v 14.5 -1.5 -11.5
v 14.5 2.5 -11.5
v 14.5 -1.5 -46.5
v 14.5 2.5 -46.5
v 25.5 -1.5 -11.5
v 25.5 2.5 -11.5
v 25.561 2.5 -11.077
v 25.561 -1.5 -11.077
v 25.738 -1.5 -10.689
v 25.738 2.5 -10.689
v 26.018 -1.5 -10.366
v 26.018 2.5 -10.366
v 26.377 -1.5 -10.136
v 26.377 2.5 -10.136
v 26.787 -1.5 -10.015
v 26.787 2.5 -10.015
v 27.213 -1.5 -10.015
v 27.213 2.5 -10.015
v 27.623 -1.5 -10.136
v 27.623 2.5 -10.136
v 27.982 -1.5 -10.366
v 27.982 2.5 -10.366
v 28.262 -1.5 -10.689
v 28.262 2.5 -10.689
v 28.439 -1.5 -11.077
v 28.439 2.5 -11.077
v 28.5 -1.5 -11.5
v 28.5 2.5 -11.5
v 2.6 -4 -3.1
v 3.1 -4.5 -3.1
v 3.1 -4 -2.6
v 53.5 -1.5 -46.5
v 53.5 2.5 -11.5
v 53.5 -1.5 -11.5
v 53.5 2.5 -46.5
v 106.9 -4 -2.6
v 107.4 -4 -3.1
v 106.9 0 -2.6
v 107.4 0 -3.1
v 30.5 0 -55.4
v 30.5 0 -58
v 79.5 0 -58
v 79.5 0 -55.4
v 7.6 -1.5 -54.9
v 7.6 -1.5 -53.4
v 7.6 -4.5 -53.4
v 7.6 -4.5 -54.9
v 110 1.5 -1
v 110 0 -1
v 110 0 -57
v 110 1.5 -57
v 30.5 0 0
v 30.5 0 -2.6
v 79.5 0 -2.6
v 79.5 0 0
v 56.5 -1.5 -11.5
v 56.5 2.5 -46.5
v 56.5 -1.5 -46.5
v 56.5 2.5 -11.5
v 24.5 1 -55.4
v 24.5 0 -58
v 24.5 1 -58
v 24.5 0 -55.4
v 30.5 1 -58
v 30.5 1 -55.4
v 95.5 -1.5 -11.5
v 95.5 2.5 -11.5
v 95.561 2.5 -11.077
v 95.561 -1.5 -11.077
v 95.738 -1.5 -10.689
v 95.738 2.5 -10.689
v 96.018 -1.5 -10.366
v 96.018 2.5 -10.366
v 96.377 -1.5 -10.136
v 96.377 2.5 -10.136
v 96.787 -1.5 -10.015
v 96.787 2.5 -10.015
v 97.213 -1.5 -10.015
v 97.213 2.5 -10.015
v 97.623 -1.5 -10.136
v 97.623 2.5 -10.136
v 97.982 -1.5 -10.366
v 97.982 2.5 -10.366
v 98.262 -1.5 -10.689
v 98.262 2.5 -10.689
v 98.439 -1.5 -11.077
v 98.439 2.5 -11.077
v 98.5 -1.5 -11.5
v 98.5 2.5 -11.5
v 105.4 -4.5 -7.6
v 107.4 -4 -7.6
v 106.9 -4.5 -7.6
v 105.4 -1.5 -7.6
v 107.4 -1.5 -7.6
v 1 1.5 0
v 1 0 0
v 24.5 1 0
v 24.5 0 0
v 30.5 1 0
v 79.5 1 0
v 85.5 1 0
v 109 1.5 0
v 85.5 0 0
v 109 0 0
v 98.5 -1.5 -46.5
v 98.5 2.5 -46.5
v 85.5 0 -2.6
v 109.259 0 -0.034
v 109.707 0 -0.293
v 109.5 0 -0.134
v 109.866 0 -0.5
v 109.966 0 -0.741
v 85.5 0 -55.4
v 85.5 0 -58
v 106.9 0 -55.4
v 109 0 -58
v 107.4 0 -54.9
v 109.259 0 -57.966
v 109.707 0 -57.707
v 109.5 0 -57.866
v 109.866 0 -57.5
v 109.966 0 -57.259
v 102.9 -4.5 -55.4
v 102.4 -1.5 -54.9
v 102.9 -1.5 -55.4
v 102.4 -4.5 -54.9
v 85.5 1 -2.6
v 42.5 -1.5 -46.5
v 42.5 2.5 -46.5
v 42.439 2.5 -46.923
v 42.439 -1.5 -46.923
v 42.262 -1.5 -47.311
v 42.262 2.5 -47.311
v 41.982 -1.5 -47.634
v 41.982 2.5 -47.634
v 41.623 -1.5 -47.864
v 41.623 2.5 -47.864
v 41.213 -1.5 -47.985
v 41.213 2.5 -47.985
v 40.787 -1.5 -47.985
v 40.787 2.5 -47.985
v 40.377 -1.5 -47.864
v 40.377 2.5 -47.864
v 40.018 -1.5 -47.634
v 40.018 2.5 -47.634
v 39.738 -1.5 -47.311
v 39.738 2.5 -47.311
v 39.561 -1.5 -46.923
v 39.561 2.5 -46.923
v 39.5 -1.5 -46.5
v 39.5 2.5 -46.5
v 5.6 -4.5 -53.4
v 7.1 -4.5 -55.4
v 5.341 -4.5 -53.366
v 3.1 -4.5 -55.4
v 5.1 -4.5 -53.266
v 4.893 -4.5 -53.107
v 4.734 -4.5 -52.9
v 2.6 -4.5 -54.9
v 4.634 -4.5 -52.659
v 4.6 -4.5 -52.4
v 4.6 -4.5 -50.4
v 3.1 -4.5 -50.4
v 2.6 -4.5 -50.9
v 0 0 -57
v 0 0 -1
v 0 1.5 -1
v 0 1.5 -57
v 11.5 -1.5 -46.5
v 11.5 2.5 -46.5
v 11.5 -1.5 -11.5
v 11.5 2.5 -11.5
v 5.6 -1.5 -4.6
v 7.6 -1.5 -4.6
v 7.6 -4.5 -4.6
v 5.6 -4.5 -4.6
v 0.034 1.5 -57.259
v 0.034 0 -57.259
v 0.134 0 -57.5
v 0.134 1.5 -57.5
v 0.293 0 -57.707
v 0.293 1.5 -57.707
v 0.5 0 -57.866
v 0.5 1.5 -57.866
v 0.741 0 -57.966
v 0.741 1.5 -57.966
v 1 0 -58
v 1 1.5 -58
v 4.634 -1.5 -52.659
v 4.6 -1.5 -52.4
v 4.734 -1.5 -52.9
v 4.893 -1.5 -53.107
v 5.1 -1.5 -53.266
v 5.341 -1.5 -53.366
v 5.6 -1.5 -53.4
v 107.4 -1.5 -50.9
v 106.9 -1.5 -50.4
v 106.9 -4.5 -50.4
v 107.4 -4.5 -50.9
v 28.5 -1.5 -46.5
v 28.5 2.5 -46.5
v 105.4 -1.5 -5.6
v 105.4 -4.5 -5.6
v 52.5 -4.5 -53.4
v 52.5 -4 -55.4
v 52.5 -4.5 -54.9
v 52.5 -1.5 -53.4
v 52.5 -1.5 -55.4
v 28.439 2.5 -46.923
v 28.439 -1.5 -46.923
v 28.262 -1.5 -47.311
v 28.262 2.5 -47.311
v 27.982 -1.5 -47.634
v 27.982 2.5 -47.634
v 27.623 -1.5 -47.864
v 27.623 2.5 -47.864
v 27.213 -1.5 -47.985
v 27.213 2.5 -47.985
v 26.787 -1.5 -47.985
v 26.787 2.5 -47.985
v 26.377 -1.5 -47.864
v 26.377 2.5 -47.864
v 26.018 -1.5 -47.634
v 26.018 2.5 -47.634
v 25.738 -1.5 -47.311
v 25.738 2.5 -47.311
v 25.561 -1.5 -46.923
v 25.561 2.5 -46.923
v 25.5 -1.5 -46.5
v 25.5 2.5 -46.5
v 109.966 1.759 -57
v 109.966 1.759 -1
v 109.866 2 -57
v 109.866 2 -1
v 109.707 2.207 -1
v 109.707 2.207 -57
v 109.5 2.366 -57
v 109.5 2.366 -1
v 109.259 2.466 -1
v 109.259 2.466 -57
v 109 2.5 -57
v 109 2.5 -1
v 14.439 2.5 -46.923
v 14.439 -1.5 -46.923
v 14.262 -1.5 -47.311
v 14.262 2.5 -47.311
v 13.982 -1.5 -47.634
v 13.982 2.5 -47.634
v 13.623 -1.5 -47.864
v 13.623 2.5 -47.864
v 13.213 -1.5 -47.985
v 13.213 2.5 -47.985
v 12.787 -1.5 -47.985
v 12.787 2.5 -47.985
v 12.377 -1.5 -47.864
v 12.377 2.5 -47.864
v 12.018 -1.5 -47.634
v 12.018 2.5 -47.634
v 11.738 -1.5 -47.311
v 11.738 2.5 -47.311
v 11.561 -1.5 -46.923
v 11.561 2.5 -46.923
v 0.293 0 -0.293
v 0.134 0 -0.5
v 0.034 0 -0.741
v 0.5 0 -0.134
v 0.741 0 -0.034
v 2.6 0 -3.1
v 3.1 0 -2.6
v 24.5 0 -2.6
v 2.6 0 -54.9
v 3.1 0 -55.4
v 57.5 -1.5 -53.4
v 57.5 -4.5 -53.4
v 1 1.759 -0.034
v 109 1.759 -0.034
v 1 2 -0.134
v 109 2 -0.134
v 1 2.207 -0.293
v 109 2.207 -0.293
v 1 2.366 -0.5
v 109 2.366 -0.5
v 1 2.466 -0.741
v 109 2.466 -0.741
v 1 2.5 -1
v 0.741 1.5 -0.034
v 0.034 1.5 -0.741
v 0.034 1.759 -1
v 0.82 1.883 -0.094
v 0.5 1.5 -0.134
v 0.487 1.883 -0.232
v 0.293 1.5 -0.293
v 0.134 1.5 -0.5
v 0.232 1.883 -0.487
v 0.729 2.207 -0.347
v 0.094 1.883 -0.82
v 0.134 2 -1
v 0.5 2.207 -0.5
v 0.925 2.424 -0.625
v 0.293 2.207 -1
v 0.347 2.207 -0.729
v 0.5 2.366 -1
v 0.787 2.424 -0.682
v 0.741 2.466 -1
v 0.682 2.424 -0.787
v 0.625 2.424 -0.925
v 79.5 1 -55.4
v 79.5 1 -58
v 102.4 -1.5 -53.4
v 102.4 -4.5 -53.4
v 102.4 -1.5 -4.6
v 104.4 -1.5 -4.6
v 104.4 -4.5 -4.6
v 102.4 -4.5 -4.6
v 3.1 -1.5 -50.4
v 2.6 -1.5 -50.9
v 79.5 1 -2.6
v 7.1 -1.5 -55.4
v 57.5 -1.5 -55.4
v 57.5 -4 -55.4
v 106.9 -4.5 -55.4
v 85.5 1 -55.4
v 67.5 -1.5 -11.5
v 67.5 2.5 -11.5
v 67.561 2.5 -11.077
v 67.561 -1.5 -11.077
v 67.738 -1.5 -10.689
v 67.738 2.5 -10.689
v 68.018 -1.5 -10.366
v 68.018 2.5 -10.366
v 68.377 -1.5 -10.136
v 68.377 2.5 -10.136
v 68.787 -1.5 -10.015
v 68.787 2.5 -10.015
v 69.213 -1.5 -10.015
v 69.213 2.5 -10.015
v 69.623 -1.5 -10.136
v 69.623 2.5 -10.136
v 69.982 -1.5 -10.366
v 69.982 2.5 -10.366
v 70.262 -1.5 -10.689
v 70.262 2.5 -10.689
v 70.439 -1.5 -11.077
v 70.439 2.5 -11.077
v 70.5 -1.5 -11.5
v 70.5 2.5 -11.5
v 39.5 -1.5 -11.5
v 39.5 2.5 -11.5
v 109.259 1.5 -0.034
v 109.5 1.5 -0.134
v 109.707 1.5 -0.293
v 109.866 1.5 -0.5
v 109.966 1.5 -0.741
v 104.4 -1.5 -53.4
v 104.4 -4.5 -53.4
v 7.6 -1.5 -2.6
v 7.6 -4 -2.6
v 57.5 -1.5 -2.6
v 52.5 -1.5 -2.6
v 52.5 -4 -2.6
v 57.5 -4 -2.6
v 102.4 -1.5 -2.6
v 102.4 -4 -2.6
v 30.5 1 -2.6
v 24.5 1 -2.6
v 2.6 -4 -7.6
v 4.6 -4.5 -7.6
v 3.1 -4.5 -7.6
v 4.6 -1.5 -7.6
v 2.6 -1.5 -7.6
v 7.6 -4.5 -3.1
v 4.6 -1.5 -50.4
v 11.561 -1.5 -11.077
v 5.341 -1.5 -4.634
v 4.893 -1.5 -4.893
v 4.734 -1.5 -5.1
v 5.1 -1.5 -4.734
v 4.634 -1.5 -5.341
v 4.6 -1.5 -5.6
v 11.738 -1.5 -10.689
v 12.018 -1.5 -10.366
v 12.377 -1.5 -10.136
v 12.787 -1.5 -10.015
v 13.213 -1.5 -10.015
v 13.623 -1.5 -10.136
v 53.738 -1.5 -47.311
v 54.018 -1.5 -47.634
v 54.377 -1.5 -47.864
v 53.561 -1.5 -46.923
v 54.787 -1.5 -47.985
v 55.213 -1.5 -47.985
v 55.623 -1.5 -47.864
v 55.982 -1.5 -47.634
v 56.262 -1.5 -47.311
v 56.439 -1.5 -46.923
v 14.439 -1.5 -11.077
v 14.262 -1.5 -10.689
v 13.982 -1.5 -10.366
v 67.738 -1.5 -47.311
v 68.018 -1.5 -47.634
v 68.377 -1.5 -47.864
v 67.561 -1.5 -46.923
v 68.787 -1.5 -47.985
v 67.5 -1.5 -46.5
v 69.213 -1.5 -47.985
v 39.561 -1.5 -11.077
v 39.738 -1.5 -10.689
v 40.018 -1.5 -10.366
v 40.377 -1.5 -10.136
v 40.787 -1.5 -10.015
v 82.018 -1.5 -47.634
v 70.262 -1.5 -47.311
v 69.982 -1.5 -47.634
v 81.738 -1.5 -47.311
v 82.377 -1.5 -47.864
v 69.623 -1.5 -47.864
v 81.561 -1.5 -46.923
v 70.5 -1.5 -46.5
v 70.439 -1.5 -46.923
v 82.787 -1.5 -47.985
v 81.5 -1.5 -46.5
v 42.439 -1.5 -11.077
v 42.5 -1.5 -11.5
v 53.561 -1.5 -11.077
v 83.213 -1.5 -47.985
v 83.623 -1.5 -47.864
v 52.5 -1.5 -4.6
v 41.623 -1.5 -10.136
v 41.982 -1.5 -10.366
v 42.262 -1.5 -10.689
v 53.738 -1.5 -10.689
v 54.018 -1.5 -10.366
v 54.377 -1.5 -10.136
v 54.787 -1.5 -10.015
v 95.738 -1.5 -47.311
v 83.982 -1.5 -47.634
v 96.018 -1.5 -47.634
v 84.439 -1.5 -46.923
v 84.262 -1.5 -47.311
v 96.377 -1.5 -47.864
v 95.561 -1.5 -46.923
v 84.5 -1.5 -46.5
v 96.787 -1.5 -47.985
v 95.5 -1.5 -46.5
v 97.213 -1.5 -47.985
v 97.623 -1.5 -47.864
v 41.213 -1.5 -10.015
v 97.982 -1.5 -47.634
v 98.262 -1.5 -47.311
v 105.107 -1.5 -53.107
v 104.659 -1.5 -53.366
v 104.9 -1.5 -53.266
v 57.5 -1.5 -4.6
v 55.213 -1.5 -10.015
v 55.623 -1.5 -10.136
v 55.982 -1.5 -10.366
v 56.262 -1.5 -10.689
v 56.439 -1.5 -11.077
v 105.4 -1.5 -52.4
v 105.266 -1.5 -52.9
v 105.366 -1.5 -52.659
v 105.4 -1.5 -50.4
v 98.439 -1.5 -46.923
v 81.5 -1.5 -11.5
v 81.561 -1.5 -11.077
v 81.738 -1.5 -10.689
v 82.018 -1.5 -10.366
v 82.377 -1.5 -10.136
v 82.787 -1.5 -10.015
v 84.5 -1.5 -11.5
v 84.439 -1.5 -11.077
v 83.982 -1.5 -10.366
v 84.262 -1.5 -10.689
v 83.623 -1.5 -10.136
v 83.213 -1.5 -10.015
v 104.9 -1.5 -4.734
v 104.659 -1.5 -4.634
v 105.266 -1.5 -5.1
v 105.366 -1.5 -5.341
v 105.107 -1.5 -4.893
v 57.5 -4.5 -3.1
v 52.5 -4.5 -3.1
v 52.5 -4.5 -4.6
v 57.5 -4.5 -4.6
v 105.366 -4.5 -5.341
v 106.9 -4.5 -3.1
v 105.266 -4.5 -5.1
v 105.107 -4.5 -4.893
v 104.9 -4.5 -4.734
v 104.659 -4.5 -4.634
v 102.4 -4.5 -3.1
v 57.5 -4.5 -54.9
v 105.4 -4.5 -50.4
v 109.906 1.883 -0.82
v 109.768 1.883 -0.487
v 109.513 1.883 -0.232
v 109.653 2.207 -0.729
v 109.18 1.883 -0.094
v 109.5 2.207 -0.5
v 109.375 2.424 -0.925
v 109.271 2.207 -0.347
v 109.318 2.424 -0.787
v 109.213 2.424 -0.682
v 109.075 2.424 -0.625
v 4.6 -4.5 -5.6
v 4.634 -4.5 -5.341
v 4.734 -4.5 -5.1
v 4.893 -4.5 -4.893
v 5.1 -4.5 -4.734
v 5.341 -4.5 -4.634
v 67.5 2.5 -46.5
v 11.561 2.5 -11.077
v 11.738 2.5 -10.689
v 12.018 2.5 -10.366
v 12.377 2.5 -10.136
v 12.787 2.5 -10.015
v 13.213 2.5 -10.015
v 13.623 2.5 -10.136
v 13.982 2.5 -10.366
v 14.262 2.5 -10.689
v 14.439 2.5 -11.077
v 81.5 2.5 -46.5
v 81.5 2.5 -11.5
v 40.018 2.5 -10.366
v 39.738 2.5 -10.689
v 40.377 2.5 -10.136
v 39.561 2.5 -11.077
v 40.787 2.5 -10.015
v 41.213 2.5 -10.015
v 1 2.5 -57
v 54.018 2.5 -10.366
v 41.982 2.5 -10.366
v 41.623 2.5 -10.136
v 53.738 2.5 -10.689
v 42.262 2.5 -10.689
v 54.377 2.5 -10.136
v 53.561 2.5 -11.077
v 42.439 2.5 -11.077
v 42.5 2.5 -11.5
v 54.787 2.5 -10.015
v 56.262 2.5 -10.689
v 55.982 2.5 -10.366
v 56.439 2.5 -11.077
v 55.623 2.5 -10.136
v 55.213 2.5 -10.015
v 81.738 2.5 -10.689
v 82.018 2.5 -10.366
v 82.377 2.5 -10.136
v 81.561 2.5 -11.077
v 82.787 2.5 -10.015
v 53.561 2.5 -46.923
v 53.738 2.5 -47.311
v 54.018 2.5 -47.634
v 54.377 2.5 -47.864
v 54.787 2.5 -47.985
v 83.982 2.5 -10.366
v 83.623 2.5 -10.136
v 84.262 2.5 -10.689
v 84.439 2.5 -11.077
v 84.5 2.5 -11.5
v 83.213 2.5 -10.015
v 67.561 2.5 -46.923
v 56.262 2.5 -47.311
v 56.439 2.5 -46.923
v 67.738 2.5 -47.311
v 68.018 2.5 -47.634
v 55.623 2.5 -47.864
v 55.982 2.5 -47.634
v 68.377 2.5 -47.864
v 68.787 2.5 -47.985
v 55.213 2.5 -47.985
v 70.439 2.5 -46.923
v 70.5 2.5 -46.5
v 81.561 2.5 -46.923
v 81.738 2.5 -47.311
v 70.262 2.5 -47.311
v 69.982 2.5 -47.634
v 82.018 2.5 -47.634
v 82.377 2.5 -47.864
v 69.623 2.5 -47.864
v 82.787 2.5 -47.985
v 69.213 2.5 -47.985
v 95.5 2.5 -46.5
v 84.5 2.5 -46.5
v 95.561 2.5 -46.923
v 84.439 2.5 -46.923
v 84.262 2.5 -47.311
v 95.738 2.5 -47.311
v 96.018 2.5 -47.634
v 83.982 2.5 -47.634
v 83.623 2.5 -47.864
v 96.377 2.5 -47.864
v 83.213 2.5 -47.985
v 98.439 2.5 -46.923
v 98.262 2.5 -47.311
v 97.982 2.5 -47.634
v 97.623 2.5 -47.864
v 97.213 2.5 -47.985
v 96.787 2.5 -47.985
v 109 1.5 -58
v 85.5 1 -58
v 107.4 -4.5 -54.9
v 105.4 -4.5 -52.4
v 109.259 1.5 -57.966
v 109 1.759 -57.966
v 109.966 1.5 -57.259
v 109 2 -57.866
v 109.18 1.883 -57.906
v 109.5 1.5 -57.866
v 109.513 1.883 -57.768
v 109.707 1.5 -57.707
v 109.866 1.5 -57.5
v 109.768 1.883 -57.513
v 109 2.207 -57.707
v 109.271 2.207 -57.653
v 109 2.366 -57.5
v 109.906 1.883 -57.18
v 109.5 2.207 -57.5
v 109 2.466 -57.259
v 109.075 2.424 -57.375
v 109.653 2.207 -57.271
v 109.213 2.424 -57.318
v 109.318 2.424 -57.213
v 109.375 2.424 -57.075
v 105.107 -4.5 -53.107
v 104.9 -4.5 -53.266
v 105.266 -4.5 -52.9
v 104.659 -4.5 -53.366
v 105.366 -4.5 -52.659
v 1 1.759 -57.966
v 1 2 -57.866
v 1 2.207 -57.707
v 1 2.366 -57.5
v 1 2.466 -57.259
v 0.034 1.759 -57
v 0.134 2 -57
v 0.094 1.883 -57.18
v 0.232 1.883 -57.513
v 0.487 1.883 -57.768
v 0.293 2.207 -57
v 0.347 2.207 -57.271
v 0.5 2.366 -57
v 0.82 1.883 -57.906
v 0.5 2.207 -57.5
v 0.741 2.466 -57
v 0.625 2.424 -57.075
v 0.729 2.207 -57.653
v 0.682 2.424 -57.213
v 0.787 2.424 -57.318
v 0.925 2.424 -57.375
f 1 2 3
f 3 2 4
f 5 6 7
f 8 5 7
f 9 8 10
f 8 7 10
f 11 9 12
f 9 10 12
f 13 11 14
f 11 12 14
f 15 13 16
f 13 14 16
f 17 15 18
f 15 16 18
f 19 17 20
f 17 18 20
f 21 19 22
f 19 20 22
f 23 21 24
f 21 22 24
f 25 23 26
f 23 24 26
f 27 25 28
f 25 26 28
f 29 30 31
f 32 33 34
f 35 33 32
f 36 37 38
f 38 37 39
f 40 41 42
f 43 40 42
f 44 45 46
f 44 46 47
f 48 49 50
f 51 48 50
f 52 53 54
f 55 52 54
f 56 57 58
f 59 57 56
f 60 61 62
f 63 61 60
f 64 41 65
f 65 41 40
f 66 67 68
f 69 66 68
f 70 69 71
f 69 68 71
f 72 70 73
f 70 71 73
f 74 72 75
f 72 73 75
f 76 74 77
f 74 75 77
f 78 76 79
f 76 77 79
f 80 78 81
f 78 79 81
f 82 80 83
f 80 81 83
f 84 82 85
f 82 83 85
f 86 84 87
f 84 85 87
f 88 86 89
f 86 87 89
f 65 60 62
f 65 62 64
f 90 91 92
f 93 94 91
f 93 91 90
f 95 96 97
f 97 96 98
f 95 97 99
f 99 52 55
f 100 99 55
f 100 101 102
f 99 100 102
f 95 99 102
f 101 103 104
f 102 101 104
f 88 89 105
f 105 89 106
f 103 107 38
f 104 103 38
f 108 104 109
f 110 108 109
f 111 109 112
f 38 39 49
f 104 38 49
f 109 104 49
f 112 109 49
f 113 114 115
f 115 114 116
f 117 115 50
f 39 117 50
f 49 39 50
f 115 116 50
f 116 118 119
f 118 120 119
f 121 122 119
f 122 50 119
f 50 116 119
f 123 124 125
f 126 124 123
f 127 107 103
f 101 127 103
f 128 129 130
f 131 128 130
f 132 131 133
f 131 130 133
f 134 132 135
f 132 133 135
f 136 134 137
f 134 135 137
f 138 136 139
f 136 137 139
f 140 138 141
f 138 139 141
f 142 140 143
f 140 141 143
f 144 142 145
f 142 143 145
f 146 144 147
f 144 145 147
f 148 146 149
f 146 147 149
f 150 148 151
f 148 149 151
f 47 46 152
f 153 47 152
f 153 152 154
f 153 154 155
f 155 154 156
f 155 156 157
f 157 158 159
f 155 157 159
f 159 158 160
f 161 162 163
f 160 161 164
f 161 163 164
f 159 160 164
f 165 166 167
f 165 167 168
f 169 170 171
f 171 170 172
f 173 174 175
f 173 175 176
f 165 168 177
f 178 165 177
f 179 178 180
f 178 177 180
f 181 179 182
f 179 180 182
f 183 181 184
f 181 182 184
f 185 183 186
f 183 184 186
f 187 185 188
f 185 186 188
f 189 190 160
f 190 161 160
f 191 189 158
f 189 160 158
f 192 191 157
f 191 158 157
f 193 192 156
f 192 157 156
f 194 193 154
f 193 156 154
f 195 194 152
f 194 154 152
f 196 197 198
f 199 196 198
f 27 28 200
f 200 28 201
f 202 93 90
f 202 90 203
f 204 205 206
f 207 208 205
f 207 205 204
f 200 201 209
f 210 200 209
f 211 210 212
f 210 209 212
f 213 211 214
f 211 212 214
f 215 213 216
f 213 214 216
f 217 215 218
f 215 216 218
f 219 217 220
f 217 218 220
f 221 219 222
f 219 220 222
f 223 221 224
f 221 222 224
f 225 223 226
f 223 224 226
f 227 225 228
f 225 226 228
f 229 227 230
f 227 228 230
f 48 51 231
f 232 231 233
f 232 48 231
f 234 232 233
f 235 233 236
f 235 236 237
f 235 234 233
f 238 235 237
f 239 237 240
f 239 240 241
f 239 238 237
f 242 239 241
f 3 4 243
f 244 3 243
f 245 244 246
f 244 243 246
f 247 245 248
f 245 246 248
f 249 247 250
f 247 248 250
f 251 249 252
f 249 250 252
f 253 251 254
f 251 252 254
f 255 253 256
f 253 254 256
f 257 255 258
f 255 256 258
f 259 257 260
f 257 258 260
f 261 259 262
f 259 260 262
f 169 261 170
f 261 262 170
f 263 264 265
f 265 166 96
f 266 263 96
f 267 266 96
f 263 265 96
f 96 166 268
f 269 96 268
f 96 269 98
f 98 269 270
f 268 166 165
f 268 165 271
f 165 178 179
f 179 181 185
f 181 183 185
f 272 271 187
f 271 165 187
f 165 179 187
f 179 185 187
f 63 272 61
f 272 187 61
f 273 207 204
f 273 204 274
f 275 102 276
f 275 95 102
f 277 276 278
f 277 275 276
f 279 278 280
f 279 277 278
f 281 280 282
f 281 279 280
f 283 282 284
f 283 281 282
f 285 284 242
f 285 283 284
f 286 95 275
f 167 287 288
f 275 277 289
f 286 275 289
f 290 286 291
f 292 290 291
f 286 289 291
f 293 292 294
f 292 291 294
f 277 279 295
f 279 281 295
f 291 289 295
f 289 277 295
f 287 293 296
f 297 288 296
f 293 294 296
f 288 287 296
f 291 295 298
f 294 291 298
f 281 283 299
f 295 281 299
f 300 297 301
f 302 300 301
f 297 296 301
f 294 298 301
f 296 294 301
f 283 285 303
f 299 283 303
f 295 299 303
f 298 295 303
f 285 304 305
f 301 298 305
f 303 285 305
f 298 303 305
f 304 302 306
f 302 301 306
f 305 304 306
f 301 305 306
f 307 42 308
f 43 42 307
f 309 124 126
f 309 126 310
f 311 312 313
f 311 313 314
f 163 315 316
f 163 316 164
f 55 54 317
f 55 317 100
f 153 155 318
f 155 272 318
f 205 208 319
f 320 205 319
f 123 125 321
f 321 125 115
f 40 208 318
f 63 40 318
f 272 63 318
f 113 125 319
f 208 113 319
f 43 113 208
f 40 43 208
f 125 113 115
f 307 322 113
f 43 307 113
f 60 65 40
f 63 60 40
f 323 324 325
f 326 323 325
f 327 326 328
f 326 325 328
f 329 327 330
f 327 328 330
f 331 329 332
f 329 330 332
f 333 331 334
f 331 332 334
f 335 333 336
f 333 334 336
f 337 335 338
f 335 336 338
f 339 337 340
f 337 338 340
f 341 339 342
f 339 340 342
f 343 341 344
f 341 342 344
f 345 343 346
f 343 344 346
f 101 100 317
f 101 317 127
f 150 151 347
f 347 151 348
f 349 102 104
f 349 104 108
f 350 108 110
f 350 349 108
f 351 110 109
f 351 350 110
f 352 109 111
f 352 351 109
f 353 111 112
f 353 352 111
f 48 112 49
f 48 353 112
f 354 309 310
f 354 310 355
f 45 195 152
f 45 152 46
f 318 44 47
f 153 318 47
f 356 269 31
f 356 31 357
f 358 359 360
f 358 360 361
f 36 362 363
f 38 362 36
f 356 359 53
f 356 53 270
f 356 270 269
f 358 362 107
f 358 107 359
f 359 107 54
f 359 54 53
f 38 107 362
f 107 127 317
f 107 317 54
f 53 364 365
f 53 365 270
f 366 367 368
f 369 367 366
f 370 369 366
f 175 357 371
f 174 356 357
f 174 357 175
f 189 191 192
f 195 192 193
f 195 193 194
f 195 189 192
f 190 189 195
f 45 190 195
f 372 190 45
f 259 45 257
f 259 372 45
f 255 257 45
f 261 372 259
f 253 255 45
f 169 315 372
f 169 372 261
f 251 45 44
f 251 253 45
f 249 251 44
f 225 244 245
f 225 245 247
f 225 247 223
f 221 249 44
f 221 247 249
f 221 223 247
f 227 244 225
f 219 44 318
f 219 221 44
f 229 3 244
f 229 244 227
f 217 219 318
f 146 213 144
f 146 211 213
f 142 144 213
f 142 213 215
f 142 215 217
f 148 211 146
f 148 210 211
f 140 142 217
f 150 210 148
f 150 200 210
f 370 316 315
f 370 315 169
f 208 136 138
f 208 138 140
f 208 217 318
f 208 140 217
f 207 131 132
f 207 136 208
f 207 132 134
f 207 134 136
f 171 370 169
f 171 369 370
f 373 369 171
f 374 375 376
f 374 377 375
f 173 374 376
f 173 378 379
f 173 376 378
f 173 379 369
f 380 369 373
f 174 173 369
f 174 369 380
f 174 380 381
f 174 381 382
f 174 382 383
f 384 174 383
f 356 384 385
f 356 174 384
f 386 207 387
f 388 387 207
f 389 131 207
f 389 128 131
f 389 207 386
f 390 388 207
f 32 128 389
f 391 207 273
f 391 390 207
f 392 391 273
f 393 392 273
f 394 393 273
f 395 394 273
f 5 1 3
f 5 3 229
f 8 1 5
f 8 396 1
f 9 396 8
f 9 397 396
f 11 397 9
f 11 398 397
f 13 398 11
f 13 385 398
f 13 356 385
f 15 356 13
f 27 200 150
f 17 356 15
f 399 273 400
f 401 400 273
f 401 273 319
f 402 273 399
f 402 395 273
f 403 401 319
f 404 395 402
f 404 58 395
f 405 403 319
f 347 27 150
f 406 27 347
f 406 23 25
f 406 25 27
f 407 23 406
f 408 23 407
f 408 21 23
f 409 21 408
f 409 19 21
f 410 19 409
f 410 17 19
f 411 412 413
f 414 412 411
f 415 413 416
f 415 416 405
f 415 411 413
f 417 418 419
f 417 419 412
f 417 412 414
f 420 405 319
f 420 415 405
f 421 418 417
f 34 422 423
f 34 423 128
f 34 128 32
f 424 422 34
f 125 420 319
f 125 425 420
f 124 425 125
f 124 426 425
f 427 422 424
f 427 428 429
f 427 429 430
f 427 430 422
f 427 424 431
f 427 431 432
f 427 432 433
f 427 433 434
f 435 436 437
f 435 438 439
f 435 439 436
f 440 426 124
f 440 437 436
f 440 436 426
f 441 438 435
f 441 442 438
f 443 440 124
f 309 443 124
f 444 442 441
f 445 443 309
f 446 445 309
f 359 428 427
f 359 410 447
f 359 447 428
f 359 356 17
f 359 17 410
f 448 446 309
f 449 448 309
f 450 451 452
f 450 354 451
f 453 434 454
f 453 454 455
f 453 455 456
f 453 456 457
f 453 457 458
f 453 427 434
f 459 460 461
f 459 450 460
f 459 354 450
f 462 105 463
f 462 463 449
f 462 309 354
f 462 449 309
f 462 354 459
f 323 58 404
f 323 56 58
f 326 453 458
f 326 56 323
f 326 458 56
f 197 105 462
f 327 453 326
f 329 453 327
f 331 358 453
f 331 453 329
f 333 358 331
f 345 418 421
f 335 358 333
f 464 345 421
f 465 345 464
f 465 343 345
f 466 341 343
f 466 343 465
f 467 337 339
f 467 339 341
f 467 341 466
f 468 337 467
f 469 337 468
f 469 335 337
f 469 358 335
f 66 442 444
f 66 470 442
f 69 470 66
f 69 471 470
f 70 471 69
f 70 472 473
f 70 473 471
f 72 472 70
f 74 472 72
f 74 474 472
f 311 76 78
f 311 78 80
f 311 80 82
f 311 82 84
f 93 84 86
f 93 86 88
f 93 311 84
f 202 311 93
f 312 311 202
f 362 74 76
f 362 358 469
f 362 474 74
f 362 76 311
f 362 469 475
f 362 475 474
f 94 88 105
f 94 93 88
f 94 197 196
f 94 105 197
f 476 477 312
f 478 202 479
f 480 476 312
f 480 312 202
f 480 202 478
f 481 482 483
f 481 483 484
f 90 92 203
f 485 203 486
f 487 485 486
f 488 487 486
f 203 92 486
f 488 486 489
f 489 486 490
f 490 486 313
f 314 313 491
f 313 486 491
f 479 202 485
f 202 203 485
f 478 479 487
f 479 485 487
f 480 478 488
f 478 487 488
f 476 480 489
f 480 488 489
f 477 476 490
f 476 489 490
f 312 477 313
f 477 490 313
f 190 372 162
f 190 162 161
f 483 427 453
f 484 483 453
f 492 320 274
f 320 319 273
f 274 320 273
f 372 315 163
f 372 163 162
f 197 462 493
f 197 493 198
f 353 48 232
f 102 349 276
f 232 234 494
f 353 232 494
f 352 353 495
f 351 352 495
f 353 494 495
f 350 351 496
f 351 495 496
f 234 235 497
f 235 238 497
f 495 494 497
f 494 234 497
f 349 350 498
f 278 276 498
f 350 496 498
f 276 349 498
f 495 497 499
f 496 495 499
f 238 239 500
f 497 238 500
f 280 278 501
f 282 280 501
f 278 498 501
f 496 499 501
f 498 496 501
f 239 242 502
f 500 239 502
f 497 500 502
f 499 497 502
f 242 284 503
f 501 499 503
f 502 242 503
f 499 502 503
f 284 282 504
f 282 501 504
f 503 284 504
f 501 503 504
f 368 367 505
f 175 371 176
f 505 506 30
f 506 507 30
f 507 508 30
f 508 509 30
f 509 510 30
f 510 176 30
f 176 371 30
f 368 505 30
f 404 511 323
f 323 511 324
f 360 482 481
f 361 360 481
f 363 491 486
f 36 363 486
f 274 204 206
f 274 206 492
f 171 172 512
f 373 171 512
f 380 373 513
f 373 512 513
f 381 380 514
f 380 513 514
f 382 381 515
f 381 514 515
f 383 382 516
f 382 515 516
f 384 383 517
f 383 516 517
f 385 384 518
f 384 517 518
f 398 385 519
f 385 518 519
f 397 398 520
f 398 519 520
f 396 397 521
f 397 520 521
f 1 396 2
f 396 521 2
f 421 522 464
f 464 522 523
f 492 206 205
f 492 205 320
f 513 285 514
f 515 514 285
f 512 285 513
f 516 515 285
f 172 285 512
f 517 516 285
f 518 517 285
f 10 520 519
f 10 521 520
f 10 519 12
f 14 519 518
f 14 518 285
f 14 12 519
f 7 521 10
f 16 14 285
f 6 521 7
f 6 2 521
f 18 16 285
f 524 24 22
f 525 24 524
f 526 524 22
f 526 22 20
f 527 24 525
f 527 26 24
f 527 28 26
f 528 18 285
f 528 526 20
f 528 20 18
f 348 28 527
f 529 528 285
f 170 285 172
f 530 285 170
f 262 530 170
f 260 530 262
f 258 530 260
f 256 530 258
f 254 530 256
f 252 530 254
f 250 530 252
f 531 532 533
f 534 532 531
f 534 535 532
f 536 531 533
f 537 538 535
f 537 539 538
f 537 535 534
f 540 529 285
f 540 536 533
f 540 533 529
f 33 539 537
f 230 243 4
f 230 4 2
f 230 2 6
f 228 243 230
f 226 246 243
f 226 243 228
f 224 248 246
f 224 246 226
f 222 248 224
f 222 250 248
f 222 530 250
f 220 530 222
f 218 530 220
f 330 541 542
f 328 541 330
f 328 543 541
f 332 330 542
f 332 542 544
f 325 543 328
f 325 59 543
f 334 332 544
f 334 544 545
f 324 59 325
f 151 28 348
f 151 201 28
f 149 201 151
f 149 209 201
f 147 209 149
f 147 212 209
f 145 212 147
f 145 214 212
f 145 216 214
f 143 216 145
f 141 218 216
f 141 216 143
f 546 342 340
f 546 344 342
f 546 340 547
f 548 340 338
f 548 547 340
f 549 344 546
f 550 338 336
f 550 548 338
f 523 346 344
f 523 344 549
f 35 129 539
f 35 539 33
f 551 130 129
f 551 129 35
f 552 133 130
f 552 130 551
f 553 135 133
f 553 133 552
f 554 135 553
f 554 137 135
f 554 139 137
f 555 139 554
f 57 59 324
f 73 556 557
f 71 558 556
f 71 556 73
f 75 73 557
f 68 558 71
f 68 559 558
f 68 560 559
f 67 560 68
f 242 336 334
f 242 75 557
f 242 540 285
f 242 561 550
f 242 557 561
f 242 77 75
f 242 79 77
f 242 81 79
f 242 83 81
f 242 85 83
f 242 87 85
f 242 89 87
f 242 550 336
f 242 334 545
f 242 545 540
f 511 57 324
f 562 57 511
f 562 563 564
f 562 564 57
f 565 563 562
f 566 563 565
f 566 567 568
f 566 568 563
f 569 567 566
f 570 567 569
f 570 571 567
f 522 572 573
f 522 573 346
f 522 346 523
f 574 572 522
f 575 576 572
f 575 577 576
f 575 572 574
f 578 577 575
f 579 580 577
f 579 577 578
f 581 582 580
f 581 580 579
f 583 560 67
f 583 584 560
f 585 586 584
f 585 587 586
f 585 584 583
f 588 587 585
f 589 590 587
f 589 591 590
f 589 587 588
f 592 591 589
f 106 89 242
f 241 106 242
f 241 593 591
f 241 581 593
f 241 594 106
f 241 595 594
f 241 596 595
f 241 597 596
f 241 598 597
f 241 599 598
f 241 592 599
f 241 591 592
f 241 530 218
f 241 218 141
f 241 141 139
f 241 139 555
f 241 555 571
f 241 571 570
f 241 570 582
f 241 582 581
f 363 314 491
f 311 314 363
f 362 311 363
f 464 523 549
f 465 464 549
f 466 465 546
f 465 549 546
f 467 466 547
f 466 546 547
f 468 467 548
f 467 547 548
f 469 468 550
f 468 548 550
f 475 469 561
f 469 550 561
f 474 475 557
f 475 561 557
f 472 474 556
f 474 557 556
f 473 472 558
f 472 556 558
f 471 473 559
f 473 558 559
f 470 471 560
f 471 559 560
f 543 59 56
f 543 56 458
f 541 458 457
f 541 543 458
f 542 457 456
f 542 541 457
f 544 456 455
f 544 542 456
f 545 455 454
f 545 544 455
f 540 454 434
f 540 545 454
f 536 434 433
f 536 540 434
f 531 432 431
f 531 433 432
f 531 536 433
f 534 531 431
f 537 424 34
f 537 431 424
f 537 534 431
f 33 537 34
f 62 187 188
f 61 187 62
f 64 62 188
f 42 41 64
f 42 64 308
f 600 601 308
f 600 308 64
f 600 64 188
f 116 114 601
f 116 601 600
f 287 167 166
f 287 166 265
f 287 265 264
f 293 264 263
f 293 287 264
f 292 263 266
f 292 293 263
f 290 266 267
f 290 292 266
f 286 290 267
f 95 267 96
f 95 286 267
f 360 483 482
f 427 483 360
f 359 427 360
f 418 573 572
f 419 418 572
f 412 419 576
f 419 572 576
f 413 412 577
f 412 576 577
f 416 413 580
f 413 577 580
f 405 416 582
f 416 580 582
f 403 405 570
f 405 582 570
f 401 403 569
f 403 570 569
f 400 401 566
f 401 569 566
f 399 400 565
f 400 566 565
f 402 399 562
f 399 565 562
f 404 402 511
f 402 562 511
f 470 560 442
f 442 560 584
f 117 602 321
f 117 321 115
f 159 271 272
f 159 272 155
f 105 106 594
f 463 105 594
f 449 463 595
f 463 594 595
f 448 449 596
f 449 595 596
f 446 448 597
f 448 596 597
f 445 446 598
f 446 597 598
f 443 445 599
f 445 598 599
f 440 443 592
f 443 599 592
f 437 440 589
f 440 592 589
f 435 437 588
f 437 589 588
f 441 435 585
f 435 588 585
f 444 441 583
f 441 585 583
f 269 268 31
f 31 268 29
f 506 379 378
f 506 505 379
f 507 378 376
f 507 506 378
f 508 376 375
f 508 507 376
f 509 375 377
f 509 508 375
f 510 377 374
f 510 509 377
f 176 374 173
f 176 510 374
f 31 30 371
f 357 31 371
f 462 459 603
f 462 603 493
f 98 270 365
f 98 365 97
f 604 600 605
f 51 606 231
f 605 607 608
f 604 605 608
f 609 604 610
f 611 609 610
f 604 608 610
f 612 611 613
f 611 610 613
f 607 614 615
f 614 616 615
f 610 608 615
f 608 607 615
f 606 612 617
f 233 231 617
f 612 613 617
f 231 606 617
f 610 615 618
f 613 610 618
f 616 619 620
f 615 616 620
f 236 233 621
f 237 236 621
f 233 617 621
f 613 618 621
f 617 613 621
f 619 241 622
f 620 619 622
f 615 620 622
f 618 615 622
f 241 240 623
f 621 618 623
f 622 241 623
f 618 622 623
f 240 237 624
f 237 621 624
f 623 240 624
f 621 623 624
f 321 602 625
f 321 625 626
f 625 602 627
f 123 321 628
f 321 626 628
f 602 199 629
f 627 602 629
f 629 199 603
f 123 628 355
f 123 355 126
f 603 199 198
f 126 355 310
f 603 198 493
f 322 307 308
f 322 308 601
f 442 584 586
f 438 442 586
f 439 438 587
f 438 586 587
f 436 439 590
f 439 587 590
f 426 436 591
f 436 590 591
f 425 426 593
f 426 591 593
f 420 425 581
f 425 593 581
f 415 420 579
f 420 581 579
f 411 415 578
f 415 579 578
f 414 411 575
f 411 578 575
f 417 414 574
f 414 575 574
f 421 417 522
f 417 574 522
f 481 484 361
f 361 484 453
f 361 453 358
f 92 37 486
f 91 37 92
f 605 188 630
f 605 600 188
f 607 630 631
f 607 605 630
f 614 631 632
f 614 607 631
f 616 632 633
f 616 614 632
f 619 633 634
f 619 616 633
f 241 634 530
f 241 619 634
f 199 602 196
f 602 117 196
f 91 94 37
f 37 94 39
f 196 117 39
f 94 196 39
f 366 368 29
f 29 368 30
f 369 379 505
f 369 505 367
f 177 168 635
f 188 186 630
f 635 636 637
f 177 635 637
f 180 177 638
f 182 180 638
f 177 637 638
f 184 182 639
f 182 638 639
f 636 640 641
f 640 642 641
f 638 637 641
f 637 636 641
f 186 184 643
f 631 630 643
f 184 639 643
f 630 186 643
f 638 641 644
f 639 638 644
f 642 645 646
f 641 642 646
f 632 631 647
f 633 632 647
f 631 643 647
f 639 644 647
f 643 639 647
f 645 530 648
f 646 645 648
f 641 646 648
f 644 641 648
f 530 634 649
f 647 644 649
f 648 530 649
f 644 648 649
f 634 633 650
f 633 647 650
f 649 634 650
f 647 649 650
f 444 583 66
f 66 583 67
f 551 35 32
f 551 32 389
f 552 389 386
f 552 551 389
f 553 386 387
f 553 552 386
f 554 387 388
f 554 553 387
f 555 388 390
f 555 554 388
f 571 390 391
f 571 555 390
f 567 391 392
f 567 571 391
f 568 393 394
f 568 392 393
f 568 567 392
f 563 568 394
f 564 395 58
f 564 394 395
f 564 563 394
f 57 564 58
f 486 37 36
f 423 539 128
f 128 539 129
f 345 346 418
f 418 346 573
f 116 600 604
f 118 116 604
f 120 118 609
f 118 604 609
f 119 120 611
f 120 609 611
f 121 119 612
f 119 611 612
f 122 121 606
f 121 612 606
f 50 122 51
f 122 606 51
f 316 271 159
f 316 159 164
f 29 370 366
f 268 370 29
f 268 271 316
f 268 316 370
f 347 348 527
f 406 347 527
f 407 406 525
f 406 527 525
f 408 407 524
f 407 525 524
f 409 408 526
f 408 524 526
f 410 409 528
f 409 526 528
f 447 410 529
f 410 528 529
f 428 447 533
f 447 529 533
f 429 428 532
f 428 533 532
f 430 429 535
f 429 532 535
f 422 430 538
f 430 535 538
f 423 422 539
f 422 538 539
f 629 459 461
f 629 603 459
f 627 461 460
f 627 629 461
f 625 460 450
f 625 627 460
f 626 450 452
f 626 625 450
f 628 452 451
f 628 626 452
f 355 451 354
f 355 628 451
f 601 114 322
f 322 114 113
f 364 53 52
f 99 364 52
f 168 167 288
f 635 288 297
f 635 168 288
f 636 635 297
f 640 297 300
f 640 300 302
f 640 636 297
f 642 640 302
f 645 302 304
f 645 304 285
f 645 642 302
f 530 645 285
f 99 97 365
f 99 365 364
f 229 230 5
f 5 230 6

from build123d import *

# Parameters (mm, degrees)
SKETCH1_W           = 110
SKETCH1_H           = 58
BOSS_EXTRUDE1_DEPTH = 2.5
SKETCH2_W           = 104.8
SKETCH2_H           = 52.8
BOSS_EXTRUDE2_DEPTH = 1.5
SKETCH3_W           = 5
SKETCH3_H           = 2
BOSS_EXTRUDE3_DEPTH = 3
FILLET1_R           = 1
SKETCH4_W           = 6
SKETCH4_H           = 2.6
CUT_EXTRUDE1_DEPTH  = 1
FILLET2_R           = 1
CHAMFER1_SIZE       = 0.5
CUT_EXTRUDE2_DEPTH  = 125.551194294
FILLET3_R           = 1


with BuildPart() as part:
    # Sketch1 → Boss-Extrude1 (new body)
    with BuildSketch(Plane(origin=(0, 0, 0), x_dir=(1, 0, 0), z_dir=(0, 1, 0))):
        with Locations((55, 29)):
            Rectangle(SKETCH1_W, SKETCH1_H)
    extrude(amount=BOSS_EXTRUDE1_DEPTH)

    # Sketch2 → Boss-Extrude2 (add)
    with BuildSketch(Plane.XZ):
        with Locations((55, -29)):
            Rectangle(SKETCH2_W, SKETCH2_H)
    extrude(amount=BOSS_EXTRUDE2_DEPTH)

    # Sketch3 → Boss-Extrude3 (add)
    with BuildSketch(Plane.XZ.offset(1.5)):
        with Locations((55, -3.6)):
            Rectangle(SKETCH3_W, SKETCH3_H)
        Polygon((2.6, -2.6), (7.6, -2.6), (7.6, -4.6), (4.6, -4.6), (4.6, -7.6), (2.6, -7.6), align=None)
        Polygon((107.4, -2.6), (107.4, -7.6), (105.4, -7.6), (105.4, -4.6), (102.4, -4.6), (102.4, -2.6), align=None)
        Polygon((107.4, -55.4), (102.4, -55.4), (102.4, -53.4), (105.4, -53.4), (105.4, -50.4), (107.4, -50.4), align=None)
        with Locations((55, -54.4)):
            Rectangle(SKETCH3_W, SKETCH3_H)
        Polygon((2.6, -55.4), (2.6, -50.4), (4.6, -50.4), (4.6, -53.4), (7.6, -53.4), (7.6, -55.4), align=None)
    extrude(amount=BOSS_EXTRUDE3_DEPTH)

    # Fillet1
    fillet1_edges = [part.edges().sort_by_distance(p)[0] for p in [
        (105.4, -3, -53.4),
        (4.6, -3, -4.6),
        (105.4, -3, -4.6),
        (4.6, -3, -53.4),
    ]]
    fillet(fillet1_edges, radius=FILLET1_R)

    # Sketch4 → Cut-Extrude1 (cut)
    with BuildSketch(Plane.XZ):
        with Locations((27.5, -1.3)):
            Rectangle(SKETCH4_W, SKETCH4_H)
        with Locations((82.5, -1.3)):
            Rectangle(SKETCH4_W, SKETCH4_H)
        with Locations((82.5, -56.7)):
            Rectangle(SKETCH4_W, SKETCH4_H)
        with Locations((27.5, -56.7)):
            Rectangle(SKETCH4_W, SKETCH4_H)
    extrude(amount=-CUT_EXTRUDE1_DEPTH, mode=Mode.SUBTRACT)

    # Fillet2
    fillet2_edges = [part.edges().sort_by_distance(p)[0] for p in [
        (0, 1.25, -58),
        (110, 1.25, -58),
        (110, 1.25, 0),
        (0, 1.25, 0),
    ]]
    fillet(fillet2_edges, radius=FILLET2_R)

    # Chamfer1
    chamfer1_edges = [part.edges().sort_by_distance(p)[0] for p in [
        (55, -4.5, -55.4),
        (2.6, -3, -50.4),
        (2.6, -2.25, -55.4),
        (7.6, -3, -55.4),
        (107.4, -3, -50.4),
        (102.4, -3, -55.4),
        (107.4, -2.25, -55.4),
        (107.4, -2.25, -2.6),
        (107.4, -4.5, -5.1),
        (104.9, -4.5, -2.6),
        (55, -4.5, -2.6),
        (2.6, -4.5, -5.1),
        (5.1, -4.5, -2.6),
        (2.6, -2.25, -2.6),
    ]]
    chamfer(chamfer1_edges, length=CHAMFER1_SIZE)

    # Sketch5 → Cut-Extrude2 (cut, through all)
    with BuildSketch(Plane(origin=(0, 2.5, 0), x_dir=(1, 0, 0), z_dir=(0, 1, 0))):
        with BuildLine():
            Line((56.5, 46.5), (56.5, 11.5))
            ThreePointArc((56.5, 11.5), (55, 10), (53.5, 11.5))
            Line((53.5, 11.5), (53.5, 46.5))
            ThreePointArc((53.5, 46.5), (55, 48), (56.5, 46.5))
        make_face()
        with BuildLine():
            Line((67.5, 46.5), (67.5, 11.5))
            ThreePointArc((67.5, 11.5), (69, 10), (70.5, 11.5))
            Line((70.5, 11.5), (70.5, 46.5))
            ThreePointArc((70.5, 46.5), (69, 48), (67.5, 46.5))
        make_face()
        with BuildLine():
            Line((81.5, 46.5), (81.5, 11.5))
            ThreePointArc((81.5, 11.5), (83, 10), (84.5, 11.5))
            Line((84.5, 11.5), (84.5, 46.5))
            ThreePointArc((84.5, 46.5), (83, 48), (81.5, 46.5))
        make_face()
        with BuildLine():
            Line((95.5, 46.5), (95.5, 11.5))
            ThreePointArc((95.5, 11.5), (97, 10), (98.5, 11.5))
            Line((98.5, 11.5), (98.5, 46.5))
            ThreePointArc((98.5, 46.5), (97, 48), (95.5, 46.5))
        make_face()
        with BuildLine():
            Line((39.5, 46.5), (39.5, 11.5))
            ThreePointArc((39.5, 11.5), (41, 10), (42.5, 11.5))
            Line((42.5, 11.5), (42.5, 46.5))
            ThreePointArc((42.5, 46.5), (41, 48), (39.5, 46.5))
        make_face()
        with BuildLine():
            Line((25.5, 46.5), (25.5, 11.5))
            ThreePointArc((25.5, 11.5), (27, 10), (28.5, 11.5))
            Line((28.5, 11.5), (28.5, 46.5))
            ThreePointArc((28.5, 46.5), (27, 48), (25.5, 46.5))
        make_face()
        with BuildLine():
            Line((11.5, 46.5), (11.5, 11.5))
            ThreePointArc((11.5, 11.5), (13, 10), (14.5, 11.5))
            Line((14.5, 11.5), (14.5, 46.5))
            ThreePointArc((14.5, 46.5), (13, 48), (11.5, 46.5))
        make_face()
    extrude(amount=-CUT_EXTRUDE2_DEPTH, mode=Mode.SUBTRACT)

    # Fillet3
    fillet3_edges = [part.edges().sort_by_distance(p)[0] for p in [
        (0, 2.5, -29),
        (55, 2.5, -58),
        (55, 2.5, 0),
        (110, 2.5, -29),
        (109.707106781, 2.5, -0.292893219),
        (109.707106781, 2.5, -57.707106781),
        (0.292893219, 2.5, -0.292893219),
        (0.292893219, 2.5, -57.707106781),
    ]]
    fillet(fillet3_edges, radius=FILLET3_R)


solid = part.part
